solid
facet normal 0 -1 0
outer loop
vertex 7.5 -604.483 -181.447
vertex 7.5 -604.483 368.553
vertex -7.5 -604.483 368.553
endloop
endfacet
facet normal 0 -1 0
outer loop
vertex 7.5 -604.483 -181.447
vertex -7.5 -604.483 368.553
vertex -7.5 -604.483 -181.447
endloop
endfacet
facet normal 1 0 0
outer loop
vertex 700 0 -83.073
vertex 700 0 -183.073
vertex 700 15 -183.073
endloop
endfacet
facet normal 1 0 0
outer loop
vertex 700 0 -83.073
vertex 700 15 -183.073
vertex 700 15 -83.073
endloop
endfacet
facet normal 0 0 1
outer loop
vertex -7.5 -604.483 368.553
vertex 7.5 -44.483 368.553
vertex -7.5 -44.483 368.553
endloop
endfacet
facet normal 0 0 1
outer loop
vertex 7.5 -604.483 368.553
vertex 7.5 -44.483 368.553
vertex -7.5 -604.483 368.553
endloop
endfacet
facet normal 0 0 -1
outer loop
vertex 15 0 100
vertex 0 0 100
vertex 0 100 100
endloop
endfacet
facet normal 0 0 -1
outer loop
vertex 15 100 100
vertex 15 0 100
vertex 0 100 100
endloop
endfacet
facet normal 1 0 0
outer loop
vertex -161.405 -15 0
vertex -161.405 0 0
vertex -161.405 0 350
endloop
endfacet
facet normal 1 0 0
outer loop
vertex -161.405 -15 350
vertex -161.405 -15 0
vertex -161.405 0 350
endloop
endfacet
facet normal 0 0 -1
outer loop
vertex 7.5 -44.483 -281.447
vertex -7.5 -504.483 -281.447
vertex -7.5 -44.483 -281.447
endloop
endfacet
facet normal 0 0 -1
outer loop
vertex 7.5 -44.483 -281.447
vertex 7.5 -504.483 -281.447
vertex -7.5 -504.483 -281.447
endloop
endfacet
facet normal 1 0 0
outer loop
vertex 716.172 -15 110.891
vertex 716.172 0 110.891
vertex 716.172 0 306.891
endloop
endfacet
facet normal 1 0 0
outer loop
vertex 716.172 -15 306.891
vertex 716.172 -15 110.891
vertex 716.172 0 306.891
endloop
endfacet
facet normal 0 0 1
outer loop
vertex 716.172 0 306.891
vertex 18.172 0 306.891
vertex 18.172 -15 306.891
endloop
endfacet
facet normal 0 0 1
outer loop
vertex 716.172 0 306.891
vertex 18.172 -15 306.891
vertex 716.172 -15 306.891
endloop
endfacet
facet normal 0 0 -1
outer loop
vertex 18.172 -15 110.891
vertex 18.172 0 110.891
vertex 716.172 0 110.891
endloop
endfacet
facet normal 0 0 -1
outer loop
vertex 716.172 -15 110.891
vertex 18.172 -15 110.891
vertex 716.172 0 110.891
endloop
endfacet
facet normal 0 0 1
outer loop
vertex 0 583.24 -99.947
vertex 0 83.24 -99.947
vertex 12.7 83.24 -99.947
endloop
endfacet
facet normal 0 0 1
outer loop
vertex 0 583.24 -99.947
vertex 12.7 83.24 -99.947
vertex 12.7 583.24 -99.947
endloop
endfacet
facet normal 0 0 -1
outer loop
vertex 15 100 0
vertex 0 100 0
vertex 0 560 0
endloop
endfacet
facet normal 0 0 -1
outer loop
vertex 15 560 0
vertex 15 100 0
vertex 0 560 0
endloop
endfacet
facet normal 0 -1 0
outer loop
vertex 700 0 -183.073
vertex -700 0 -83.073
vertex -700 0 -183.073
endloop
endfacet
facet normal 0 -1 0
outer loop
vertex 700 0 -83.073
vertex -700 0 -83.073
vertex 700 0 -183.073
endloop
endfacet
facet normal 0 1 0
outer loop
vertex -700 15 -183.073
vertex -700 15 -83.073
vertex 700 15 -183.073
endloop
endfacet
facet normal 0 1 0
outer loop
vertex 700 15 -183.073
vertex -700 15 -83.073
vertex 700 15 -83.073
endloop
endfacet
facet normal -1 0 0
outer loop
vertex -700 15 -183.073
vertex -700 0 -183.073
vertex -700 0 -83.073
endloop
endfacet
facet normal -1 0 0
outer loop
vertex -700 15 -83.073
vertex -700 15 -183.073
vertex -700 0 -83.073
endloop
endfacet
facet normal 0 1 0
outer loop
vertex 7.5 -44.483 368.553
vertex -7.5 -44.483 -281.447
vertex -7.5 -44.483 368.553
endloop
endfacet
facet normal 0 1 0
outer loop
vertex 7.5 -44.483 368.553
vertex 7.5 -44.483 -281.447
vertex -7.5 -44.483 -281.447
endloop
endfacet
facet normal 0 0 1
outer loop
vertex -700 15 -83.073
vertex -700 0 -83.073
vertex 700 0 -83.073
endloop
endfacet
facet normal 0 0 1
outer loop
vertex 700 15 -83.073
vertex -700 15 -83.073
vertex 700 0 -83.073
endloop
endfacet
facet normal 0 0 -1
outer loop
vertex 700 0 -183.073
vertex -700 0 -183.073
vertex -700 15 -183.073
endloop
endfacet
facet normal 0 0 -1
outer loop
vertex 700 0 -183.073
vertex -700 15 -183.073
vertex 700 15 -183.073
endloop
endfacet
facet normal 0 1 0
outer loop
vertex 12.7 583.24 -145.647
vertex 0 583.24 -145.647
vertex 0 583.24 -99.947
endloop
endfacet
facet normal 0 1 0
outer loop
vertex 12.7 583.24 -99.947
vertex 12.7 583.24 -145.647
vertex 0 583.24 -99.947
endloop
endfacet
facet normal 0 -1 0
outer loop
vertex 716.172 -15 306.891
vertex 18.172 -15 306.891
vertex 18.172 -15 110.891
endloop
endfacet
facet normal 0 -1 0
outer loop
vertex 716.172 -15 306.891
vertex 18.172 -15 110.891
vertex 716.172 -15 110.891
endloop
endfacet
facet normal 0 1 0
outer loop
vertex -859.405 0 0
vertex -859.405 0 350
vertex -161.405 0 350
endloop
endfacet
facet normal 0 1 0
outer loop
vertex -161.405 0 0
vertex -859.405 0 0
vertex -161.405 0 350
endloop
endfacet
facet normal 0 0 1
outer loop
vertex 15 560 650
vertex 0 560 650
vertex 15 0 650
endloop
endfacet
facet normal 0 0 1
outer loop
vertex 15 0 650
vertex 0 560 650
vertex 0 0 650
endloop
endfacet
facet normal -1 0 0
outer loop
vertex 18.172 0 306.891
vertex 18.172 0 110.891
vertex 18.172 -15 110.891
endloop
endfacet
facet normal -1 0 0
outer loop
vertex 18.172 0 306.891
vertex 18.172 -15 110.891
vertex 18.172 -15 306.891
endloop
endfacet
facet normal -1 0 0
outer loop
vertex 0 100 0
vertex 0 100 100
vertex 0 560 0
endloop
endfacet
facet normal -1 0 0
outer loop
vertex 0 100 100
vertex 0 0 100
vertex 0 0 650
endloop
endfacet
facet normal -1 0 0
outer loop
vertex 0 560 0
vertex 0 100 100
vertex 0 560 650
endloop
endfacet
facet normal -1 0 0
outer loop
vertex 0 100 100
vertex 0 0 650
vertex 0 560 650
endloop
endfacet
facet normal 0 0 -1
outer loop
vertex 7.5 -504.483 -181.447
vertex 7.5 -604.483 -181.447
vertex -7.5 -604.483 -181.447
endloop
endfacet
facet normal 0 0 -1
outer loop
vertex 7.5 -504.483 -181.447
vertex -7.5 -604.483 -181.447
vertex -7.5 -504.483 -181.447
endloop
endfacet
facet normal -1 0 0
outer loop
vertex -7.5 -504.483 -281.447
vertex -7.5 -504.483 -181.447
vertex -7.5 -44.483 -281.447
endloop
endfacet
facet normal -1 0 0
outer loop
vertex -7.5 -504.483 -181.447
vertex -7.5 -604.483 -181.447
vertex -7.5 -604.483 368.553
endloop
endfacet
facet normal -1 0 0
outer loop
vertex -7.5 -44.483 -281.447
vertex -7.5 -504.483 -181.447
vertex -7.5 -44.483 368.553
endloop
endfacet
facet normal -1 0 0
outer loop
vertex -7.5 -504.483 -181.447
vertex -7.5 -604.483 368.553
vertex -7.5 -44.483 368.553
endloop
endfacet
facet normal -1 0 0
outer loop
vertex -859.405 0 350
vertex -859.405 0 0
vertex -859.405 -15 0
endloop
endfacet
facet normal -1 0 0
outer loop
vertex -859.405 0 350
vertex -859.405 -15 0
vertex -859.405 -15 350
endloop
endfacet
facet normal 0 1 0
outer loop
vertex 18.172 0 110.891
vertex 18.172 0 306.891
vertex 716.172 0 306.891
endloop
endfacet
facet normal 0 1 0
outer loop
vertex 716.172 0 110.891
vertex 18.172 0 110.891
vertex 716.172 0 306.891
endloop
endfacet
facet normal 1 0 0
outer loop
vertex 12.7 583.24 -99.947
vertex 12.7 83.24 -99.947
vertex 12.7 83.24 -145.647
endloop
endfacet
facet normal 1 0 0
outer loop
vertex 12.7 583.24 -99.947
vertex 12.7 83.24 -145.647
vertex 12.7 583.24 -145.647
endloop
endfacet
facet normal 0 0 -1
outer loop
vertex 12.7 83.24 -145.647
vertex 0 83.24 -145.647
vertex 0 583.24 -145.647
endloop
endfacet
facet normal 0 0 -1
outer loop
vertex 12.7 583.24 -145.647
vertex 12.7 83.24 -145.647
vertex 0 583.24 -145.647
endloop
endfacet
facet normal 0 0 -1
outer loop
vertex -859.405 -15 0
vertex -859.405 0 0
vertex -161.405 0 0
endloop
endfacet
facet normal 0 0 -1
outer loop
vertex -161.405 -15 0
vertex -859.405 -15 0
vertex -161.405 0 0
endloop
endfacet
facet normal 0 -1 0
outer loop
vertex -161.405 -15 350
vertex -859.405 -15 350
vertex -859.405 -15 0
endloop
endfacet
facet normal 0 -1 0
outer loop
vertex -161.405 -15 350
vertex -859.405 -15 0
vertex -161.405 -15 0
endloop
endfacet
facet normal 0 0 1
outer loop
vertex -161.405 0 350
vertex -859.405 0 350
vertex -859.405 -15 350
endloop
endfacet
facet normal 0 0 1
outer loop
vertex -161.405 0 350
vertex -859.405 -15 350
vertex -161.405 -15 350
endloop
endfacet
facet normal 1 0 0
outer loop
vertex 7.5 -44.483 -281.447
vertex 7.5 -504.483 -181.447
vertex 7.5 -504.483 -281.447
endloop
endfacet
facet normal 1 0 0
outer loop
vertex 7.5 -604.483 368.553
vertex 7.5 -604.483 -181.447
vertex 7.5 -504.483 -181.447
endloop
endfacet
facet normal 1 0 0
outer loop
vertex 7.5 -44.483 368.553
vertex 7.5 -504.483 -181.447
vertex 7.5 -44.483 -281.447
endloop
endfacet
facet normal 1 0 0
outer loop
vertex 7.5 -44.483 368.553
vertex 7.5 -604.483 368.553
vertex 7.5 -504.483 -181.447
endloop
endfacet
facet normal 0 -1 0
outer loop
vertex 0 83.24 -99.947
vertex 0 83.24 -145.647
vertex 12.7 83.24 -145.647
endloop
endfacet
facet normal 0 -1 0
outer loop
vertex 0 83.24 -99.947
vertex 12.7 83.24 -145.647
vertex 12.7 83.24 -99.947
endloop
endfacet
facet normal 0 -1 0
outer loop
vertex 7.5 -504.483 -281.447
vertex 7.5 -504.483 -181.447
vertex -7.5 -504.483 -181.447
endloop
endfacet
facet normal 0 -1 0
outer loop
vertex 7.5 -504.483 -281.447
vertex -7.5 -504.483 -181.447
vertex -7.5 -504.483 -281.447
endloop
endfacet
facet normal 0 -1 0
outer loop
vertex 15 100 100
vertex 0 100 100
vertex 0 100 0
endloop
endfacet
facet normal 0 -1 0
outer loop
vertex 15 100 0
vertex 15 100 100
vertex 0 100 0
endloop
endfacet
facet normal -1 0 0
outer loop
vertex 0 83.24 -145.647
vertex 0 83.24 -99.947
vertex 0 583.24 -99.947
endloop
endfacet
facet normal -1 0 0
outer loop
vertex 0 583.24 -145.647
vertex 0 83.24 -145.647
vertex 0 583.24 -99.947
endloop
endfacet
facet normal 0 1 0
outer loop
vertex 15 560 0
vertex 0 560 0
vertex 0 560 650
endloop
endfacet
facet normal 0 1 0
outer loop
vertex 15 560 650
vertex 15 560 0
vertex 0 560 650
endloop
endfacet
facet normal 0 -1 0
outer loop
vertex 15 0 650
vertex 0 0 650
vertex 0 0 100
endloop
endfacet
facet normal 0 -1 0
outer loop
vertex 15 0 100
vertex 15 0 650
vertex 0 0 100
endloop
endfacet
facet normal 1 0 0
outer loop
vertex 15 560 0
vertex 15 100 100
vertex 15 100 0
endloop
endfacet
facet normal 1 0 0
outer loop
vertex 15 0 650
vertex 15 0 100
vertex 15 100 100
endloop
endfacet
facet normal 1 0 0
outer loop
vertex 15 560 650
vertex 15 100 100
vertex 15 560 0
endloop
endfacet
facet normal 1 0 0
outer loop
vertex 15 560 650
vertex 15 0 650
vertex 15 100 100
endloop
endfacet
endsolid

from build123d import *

# Parameters (mm, degrees)
F1_DEPTH  = 15
F2_W      = 1400
F2_H      = 100
F3_DEPTH  = 15
F5_DEPTH  = 7.5
F6_W      = 698
F6_H      = 350
F7_DEPTH  = 15
F8_W      = 698
F8_H      = 196
F9_DEPTH  = 15
F10_W     = 500
F10_H     = 45.7
F11_DEPTH = 12.7


with BuildPart() as f1:
    # F0 (on Right) → F1 (new body)
    with BuildSketch(Plane.YZ):
        Polygon((560, 650), (0, 650), (0, 100), (100, 100), (100, 0), (560, 0), align=None)
    extrude(amount=F1_DEPTH)


with BuildPart() as f3:
    # F2 (on Front) → F3 (new body)
    with BuildSketch(Plane.XZ):
        with Locations((0, -133.072823)):
            Rectangle(F2_W, F2_H)
    extrude(amount=-F3_DEPTH)


with BuildPart() as f5:
    # F4 (on Right) → F5 (new body, symmetric)
    with BuildSketch(Plane.YZ):
        Polygon((-44.482949, 368.552807), (-604.482949, 368.552807), (-604.482949, -181.447193), (-504.482949, -181.447193), (-504.482949, -281.447193), (-44.482949, -281.447193), align=None)
    extrude(amount=F5_DEPTH, both=True)


with BuildPart() as f7:
    # F6 (on Front) → F7 (new body)
    with BuildSketch(Plane.XZ):
        with Locations((-510.4049, 175)):
            Rectangle(F6_W, F6_H)
    extrude(amount=F7_DEPTH)


with BuildPart() as f9:
    # F8 (on Front) → F9 (new body)
    with BuildSketch(Plane.XZ):
        with Locations((367.171761, 208.890735)):
            Rectangle(F8_W, F8_H)
    extrude(amount=F9_DEPTH)


with BuildPart() as f11:
    # F10 (on Right) → F11 (new body)
    with BuildSketch(Plane.YZ):
        with Locations((333.24014, -122.797173)):
            Rectangle(F10_W, F10_H)
    extrude(amount=F11_DEPTH)


solid = Compound([f1.part, f3.part, f5.part, f7.part, f9.part, f11.part])
